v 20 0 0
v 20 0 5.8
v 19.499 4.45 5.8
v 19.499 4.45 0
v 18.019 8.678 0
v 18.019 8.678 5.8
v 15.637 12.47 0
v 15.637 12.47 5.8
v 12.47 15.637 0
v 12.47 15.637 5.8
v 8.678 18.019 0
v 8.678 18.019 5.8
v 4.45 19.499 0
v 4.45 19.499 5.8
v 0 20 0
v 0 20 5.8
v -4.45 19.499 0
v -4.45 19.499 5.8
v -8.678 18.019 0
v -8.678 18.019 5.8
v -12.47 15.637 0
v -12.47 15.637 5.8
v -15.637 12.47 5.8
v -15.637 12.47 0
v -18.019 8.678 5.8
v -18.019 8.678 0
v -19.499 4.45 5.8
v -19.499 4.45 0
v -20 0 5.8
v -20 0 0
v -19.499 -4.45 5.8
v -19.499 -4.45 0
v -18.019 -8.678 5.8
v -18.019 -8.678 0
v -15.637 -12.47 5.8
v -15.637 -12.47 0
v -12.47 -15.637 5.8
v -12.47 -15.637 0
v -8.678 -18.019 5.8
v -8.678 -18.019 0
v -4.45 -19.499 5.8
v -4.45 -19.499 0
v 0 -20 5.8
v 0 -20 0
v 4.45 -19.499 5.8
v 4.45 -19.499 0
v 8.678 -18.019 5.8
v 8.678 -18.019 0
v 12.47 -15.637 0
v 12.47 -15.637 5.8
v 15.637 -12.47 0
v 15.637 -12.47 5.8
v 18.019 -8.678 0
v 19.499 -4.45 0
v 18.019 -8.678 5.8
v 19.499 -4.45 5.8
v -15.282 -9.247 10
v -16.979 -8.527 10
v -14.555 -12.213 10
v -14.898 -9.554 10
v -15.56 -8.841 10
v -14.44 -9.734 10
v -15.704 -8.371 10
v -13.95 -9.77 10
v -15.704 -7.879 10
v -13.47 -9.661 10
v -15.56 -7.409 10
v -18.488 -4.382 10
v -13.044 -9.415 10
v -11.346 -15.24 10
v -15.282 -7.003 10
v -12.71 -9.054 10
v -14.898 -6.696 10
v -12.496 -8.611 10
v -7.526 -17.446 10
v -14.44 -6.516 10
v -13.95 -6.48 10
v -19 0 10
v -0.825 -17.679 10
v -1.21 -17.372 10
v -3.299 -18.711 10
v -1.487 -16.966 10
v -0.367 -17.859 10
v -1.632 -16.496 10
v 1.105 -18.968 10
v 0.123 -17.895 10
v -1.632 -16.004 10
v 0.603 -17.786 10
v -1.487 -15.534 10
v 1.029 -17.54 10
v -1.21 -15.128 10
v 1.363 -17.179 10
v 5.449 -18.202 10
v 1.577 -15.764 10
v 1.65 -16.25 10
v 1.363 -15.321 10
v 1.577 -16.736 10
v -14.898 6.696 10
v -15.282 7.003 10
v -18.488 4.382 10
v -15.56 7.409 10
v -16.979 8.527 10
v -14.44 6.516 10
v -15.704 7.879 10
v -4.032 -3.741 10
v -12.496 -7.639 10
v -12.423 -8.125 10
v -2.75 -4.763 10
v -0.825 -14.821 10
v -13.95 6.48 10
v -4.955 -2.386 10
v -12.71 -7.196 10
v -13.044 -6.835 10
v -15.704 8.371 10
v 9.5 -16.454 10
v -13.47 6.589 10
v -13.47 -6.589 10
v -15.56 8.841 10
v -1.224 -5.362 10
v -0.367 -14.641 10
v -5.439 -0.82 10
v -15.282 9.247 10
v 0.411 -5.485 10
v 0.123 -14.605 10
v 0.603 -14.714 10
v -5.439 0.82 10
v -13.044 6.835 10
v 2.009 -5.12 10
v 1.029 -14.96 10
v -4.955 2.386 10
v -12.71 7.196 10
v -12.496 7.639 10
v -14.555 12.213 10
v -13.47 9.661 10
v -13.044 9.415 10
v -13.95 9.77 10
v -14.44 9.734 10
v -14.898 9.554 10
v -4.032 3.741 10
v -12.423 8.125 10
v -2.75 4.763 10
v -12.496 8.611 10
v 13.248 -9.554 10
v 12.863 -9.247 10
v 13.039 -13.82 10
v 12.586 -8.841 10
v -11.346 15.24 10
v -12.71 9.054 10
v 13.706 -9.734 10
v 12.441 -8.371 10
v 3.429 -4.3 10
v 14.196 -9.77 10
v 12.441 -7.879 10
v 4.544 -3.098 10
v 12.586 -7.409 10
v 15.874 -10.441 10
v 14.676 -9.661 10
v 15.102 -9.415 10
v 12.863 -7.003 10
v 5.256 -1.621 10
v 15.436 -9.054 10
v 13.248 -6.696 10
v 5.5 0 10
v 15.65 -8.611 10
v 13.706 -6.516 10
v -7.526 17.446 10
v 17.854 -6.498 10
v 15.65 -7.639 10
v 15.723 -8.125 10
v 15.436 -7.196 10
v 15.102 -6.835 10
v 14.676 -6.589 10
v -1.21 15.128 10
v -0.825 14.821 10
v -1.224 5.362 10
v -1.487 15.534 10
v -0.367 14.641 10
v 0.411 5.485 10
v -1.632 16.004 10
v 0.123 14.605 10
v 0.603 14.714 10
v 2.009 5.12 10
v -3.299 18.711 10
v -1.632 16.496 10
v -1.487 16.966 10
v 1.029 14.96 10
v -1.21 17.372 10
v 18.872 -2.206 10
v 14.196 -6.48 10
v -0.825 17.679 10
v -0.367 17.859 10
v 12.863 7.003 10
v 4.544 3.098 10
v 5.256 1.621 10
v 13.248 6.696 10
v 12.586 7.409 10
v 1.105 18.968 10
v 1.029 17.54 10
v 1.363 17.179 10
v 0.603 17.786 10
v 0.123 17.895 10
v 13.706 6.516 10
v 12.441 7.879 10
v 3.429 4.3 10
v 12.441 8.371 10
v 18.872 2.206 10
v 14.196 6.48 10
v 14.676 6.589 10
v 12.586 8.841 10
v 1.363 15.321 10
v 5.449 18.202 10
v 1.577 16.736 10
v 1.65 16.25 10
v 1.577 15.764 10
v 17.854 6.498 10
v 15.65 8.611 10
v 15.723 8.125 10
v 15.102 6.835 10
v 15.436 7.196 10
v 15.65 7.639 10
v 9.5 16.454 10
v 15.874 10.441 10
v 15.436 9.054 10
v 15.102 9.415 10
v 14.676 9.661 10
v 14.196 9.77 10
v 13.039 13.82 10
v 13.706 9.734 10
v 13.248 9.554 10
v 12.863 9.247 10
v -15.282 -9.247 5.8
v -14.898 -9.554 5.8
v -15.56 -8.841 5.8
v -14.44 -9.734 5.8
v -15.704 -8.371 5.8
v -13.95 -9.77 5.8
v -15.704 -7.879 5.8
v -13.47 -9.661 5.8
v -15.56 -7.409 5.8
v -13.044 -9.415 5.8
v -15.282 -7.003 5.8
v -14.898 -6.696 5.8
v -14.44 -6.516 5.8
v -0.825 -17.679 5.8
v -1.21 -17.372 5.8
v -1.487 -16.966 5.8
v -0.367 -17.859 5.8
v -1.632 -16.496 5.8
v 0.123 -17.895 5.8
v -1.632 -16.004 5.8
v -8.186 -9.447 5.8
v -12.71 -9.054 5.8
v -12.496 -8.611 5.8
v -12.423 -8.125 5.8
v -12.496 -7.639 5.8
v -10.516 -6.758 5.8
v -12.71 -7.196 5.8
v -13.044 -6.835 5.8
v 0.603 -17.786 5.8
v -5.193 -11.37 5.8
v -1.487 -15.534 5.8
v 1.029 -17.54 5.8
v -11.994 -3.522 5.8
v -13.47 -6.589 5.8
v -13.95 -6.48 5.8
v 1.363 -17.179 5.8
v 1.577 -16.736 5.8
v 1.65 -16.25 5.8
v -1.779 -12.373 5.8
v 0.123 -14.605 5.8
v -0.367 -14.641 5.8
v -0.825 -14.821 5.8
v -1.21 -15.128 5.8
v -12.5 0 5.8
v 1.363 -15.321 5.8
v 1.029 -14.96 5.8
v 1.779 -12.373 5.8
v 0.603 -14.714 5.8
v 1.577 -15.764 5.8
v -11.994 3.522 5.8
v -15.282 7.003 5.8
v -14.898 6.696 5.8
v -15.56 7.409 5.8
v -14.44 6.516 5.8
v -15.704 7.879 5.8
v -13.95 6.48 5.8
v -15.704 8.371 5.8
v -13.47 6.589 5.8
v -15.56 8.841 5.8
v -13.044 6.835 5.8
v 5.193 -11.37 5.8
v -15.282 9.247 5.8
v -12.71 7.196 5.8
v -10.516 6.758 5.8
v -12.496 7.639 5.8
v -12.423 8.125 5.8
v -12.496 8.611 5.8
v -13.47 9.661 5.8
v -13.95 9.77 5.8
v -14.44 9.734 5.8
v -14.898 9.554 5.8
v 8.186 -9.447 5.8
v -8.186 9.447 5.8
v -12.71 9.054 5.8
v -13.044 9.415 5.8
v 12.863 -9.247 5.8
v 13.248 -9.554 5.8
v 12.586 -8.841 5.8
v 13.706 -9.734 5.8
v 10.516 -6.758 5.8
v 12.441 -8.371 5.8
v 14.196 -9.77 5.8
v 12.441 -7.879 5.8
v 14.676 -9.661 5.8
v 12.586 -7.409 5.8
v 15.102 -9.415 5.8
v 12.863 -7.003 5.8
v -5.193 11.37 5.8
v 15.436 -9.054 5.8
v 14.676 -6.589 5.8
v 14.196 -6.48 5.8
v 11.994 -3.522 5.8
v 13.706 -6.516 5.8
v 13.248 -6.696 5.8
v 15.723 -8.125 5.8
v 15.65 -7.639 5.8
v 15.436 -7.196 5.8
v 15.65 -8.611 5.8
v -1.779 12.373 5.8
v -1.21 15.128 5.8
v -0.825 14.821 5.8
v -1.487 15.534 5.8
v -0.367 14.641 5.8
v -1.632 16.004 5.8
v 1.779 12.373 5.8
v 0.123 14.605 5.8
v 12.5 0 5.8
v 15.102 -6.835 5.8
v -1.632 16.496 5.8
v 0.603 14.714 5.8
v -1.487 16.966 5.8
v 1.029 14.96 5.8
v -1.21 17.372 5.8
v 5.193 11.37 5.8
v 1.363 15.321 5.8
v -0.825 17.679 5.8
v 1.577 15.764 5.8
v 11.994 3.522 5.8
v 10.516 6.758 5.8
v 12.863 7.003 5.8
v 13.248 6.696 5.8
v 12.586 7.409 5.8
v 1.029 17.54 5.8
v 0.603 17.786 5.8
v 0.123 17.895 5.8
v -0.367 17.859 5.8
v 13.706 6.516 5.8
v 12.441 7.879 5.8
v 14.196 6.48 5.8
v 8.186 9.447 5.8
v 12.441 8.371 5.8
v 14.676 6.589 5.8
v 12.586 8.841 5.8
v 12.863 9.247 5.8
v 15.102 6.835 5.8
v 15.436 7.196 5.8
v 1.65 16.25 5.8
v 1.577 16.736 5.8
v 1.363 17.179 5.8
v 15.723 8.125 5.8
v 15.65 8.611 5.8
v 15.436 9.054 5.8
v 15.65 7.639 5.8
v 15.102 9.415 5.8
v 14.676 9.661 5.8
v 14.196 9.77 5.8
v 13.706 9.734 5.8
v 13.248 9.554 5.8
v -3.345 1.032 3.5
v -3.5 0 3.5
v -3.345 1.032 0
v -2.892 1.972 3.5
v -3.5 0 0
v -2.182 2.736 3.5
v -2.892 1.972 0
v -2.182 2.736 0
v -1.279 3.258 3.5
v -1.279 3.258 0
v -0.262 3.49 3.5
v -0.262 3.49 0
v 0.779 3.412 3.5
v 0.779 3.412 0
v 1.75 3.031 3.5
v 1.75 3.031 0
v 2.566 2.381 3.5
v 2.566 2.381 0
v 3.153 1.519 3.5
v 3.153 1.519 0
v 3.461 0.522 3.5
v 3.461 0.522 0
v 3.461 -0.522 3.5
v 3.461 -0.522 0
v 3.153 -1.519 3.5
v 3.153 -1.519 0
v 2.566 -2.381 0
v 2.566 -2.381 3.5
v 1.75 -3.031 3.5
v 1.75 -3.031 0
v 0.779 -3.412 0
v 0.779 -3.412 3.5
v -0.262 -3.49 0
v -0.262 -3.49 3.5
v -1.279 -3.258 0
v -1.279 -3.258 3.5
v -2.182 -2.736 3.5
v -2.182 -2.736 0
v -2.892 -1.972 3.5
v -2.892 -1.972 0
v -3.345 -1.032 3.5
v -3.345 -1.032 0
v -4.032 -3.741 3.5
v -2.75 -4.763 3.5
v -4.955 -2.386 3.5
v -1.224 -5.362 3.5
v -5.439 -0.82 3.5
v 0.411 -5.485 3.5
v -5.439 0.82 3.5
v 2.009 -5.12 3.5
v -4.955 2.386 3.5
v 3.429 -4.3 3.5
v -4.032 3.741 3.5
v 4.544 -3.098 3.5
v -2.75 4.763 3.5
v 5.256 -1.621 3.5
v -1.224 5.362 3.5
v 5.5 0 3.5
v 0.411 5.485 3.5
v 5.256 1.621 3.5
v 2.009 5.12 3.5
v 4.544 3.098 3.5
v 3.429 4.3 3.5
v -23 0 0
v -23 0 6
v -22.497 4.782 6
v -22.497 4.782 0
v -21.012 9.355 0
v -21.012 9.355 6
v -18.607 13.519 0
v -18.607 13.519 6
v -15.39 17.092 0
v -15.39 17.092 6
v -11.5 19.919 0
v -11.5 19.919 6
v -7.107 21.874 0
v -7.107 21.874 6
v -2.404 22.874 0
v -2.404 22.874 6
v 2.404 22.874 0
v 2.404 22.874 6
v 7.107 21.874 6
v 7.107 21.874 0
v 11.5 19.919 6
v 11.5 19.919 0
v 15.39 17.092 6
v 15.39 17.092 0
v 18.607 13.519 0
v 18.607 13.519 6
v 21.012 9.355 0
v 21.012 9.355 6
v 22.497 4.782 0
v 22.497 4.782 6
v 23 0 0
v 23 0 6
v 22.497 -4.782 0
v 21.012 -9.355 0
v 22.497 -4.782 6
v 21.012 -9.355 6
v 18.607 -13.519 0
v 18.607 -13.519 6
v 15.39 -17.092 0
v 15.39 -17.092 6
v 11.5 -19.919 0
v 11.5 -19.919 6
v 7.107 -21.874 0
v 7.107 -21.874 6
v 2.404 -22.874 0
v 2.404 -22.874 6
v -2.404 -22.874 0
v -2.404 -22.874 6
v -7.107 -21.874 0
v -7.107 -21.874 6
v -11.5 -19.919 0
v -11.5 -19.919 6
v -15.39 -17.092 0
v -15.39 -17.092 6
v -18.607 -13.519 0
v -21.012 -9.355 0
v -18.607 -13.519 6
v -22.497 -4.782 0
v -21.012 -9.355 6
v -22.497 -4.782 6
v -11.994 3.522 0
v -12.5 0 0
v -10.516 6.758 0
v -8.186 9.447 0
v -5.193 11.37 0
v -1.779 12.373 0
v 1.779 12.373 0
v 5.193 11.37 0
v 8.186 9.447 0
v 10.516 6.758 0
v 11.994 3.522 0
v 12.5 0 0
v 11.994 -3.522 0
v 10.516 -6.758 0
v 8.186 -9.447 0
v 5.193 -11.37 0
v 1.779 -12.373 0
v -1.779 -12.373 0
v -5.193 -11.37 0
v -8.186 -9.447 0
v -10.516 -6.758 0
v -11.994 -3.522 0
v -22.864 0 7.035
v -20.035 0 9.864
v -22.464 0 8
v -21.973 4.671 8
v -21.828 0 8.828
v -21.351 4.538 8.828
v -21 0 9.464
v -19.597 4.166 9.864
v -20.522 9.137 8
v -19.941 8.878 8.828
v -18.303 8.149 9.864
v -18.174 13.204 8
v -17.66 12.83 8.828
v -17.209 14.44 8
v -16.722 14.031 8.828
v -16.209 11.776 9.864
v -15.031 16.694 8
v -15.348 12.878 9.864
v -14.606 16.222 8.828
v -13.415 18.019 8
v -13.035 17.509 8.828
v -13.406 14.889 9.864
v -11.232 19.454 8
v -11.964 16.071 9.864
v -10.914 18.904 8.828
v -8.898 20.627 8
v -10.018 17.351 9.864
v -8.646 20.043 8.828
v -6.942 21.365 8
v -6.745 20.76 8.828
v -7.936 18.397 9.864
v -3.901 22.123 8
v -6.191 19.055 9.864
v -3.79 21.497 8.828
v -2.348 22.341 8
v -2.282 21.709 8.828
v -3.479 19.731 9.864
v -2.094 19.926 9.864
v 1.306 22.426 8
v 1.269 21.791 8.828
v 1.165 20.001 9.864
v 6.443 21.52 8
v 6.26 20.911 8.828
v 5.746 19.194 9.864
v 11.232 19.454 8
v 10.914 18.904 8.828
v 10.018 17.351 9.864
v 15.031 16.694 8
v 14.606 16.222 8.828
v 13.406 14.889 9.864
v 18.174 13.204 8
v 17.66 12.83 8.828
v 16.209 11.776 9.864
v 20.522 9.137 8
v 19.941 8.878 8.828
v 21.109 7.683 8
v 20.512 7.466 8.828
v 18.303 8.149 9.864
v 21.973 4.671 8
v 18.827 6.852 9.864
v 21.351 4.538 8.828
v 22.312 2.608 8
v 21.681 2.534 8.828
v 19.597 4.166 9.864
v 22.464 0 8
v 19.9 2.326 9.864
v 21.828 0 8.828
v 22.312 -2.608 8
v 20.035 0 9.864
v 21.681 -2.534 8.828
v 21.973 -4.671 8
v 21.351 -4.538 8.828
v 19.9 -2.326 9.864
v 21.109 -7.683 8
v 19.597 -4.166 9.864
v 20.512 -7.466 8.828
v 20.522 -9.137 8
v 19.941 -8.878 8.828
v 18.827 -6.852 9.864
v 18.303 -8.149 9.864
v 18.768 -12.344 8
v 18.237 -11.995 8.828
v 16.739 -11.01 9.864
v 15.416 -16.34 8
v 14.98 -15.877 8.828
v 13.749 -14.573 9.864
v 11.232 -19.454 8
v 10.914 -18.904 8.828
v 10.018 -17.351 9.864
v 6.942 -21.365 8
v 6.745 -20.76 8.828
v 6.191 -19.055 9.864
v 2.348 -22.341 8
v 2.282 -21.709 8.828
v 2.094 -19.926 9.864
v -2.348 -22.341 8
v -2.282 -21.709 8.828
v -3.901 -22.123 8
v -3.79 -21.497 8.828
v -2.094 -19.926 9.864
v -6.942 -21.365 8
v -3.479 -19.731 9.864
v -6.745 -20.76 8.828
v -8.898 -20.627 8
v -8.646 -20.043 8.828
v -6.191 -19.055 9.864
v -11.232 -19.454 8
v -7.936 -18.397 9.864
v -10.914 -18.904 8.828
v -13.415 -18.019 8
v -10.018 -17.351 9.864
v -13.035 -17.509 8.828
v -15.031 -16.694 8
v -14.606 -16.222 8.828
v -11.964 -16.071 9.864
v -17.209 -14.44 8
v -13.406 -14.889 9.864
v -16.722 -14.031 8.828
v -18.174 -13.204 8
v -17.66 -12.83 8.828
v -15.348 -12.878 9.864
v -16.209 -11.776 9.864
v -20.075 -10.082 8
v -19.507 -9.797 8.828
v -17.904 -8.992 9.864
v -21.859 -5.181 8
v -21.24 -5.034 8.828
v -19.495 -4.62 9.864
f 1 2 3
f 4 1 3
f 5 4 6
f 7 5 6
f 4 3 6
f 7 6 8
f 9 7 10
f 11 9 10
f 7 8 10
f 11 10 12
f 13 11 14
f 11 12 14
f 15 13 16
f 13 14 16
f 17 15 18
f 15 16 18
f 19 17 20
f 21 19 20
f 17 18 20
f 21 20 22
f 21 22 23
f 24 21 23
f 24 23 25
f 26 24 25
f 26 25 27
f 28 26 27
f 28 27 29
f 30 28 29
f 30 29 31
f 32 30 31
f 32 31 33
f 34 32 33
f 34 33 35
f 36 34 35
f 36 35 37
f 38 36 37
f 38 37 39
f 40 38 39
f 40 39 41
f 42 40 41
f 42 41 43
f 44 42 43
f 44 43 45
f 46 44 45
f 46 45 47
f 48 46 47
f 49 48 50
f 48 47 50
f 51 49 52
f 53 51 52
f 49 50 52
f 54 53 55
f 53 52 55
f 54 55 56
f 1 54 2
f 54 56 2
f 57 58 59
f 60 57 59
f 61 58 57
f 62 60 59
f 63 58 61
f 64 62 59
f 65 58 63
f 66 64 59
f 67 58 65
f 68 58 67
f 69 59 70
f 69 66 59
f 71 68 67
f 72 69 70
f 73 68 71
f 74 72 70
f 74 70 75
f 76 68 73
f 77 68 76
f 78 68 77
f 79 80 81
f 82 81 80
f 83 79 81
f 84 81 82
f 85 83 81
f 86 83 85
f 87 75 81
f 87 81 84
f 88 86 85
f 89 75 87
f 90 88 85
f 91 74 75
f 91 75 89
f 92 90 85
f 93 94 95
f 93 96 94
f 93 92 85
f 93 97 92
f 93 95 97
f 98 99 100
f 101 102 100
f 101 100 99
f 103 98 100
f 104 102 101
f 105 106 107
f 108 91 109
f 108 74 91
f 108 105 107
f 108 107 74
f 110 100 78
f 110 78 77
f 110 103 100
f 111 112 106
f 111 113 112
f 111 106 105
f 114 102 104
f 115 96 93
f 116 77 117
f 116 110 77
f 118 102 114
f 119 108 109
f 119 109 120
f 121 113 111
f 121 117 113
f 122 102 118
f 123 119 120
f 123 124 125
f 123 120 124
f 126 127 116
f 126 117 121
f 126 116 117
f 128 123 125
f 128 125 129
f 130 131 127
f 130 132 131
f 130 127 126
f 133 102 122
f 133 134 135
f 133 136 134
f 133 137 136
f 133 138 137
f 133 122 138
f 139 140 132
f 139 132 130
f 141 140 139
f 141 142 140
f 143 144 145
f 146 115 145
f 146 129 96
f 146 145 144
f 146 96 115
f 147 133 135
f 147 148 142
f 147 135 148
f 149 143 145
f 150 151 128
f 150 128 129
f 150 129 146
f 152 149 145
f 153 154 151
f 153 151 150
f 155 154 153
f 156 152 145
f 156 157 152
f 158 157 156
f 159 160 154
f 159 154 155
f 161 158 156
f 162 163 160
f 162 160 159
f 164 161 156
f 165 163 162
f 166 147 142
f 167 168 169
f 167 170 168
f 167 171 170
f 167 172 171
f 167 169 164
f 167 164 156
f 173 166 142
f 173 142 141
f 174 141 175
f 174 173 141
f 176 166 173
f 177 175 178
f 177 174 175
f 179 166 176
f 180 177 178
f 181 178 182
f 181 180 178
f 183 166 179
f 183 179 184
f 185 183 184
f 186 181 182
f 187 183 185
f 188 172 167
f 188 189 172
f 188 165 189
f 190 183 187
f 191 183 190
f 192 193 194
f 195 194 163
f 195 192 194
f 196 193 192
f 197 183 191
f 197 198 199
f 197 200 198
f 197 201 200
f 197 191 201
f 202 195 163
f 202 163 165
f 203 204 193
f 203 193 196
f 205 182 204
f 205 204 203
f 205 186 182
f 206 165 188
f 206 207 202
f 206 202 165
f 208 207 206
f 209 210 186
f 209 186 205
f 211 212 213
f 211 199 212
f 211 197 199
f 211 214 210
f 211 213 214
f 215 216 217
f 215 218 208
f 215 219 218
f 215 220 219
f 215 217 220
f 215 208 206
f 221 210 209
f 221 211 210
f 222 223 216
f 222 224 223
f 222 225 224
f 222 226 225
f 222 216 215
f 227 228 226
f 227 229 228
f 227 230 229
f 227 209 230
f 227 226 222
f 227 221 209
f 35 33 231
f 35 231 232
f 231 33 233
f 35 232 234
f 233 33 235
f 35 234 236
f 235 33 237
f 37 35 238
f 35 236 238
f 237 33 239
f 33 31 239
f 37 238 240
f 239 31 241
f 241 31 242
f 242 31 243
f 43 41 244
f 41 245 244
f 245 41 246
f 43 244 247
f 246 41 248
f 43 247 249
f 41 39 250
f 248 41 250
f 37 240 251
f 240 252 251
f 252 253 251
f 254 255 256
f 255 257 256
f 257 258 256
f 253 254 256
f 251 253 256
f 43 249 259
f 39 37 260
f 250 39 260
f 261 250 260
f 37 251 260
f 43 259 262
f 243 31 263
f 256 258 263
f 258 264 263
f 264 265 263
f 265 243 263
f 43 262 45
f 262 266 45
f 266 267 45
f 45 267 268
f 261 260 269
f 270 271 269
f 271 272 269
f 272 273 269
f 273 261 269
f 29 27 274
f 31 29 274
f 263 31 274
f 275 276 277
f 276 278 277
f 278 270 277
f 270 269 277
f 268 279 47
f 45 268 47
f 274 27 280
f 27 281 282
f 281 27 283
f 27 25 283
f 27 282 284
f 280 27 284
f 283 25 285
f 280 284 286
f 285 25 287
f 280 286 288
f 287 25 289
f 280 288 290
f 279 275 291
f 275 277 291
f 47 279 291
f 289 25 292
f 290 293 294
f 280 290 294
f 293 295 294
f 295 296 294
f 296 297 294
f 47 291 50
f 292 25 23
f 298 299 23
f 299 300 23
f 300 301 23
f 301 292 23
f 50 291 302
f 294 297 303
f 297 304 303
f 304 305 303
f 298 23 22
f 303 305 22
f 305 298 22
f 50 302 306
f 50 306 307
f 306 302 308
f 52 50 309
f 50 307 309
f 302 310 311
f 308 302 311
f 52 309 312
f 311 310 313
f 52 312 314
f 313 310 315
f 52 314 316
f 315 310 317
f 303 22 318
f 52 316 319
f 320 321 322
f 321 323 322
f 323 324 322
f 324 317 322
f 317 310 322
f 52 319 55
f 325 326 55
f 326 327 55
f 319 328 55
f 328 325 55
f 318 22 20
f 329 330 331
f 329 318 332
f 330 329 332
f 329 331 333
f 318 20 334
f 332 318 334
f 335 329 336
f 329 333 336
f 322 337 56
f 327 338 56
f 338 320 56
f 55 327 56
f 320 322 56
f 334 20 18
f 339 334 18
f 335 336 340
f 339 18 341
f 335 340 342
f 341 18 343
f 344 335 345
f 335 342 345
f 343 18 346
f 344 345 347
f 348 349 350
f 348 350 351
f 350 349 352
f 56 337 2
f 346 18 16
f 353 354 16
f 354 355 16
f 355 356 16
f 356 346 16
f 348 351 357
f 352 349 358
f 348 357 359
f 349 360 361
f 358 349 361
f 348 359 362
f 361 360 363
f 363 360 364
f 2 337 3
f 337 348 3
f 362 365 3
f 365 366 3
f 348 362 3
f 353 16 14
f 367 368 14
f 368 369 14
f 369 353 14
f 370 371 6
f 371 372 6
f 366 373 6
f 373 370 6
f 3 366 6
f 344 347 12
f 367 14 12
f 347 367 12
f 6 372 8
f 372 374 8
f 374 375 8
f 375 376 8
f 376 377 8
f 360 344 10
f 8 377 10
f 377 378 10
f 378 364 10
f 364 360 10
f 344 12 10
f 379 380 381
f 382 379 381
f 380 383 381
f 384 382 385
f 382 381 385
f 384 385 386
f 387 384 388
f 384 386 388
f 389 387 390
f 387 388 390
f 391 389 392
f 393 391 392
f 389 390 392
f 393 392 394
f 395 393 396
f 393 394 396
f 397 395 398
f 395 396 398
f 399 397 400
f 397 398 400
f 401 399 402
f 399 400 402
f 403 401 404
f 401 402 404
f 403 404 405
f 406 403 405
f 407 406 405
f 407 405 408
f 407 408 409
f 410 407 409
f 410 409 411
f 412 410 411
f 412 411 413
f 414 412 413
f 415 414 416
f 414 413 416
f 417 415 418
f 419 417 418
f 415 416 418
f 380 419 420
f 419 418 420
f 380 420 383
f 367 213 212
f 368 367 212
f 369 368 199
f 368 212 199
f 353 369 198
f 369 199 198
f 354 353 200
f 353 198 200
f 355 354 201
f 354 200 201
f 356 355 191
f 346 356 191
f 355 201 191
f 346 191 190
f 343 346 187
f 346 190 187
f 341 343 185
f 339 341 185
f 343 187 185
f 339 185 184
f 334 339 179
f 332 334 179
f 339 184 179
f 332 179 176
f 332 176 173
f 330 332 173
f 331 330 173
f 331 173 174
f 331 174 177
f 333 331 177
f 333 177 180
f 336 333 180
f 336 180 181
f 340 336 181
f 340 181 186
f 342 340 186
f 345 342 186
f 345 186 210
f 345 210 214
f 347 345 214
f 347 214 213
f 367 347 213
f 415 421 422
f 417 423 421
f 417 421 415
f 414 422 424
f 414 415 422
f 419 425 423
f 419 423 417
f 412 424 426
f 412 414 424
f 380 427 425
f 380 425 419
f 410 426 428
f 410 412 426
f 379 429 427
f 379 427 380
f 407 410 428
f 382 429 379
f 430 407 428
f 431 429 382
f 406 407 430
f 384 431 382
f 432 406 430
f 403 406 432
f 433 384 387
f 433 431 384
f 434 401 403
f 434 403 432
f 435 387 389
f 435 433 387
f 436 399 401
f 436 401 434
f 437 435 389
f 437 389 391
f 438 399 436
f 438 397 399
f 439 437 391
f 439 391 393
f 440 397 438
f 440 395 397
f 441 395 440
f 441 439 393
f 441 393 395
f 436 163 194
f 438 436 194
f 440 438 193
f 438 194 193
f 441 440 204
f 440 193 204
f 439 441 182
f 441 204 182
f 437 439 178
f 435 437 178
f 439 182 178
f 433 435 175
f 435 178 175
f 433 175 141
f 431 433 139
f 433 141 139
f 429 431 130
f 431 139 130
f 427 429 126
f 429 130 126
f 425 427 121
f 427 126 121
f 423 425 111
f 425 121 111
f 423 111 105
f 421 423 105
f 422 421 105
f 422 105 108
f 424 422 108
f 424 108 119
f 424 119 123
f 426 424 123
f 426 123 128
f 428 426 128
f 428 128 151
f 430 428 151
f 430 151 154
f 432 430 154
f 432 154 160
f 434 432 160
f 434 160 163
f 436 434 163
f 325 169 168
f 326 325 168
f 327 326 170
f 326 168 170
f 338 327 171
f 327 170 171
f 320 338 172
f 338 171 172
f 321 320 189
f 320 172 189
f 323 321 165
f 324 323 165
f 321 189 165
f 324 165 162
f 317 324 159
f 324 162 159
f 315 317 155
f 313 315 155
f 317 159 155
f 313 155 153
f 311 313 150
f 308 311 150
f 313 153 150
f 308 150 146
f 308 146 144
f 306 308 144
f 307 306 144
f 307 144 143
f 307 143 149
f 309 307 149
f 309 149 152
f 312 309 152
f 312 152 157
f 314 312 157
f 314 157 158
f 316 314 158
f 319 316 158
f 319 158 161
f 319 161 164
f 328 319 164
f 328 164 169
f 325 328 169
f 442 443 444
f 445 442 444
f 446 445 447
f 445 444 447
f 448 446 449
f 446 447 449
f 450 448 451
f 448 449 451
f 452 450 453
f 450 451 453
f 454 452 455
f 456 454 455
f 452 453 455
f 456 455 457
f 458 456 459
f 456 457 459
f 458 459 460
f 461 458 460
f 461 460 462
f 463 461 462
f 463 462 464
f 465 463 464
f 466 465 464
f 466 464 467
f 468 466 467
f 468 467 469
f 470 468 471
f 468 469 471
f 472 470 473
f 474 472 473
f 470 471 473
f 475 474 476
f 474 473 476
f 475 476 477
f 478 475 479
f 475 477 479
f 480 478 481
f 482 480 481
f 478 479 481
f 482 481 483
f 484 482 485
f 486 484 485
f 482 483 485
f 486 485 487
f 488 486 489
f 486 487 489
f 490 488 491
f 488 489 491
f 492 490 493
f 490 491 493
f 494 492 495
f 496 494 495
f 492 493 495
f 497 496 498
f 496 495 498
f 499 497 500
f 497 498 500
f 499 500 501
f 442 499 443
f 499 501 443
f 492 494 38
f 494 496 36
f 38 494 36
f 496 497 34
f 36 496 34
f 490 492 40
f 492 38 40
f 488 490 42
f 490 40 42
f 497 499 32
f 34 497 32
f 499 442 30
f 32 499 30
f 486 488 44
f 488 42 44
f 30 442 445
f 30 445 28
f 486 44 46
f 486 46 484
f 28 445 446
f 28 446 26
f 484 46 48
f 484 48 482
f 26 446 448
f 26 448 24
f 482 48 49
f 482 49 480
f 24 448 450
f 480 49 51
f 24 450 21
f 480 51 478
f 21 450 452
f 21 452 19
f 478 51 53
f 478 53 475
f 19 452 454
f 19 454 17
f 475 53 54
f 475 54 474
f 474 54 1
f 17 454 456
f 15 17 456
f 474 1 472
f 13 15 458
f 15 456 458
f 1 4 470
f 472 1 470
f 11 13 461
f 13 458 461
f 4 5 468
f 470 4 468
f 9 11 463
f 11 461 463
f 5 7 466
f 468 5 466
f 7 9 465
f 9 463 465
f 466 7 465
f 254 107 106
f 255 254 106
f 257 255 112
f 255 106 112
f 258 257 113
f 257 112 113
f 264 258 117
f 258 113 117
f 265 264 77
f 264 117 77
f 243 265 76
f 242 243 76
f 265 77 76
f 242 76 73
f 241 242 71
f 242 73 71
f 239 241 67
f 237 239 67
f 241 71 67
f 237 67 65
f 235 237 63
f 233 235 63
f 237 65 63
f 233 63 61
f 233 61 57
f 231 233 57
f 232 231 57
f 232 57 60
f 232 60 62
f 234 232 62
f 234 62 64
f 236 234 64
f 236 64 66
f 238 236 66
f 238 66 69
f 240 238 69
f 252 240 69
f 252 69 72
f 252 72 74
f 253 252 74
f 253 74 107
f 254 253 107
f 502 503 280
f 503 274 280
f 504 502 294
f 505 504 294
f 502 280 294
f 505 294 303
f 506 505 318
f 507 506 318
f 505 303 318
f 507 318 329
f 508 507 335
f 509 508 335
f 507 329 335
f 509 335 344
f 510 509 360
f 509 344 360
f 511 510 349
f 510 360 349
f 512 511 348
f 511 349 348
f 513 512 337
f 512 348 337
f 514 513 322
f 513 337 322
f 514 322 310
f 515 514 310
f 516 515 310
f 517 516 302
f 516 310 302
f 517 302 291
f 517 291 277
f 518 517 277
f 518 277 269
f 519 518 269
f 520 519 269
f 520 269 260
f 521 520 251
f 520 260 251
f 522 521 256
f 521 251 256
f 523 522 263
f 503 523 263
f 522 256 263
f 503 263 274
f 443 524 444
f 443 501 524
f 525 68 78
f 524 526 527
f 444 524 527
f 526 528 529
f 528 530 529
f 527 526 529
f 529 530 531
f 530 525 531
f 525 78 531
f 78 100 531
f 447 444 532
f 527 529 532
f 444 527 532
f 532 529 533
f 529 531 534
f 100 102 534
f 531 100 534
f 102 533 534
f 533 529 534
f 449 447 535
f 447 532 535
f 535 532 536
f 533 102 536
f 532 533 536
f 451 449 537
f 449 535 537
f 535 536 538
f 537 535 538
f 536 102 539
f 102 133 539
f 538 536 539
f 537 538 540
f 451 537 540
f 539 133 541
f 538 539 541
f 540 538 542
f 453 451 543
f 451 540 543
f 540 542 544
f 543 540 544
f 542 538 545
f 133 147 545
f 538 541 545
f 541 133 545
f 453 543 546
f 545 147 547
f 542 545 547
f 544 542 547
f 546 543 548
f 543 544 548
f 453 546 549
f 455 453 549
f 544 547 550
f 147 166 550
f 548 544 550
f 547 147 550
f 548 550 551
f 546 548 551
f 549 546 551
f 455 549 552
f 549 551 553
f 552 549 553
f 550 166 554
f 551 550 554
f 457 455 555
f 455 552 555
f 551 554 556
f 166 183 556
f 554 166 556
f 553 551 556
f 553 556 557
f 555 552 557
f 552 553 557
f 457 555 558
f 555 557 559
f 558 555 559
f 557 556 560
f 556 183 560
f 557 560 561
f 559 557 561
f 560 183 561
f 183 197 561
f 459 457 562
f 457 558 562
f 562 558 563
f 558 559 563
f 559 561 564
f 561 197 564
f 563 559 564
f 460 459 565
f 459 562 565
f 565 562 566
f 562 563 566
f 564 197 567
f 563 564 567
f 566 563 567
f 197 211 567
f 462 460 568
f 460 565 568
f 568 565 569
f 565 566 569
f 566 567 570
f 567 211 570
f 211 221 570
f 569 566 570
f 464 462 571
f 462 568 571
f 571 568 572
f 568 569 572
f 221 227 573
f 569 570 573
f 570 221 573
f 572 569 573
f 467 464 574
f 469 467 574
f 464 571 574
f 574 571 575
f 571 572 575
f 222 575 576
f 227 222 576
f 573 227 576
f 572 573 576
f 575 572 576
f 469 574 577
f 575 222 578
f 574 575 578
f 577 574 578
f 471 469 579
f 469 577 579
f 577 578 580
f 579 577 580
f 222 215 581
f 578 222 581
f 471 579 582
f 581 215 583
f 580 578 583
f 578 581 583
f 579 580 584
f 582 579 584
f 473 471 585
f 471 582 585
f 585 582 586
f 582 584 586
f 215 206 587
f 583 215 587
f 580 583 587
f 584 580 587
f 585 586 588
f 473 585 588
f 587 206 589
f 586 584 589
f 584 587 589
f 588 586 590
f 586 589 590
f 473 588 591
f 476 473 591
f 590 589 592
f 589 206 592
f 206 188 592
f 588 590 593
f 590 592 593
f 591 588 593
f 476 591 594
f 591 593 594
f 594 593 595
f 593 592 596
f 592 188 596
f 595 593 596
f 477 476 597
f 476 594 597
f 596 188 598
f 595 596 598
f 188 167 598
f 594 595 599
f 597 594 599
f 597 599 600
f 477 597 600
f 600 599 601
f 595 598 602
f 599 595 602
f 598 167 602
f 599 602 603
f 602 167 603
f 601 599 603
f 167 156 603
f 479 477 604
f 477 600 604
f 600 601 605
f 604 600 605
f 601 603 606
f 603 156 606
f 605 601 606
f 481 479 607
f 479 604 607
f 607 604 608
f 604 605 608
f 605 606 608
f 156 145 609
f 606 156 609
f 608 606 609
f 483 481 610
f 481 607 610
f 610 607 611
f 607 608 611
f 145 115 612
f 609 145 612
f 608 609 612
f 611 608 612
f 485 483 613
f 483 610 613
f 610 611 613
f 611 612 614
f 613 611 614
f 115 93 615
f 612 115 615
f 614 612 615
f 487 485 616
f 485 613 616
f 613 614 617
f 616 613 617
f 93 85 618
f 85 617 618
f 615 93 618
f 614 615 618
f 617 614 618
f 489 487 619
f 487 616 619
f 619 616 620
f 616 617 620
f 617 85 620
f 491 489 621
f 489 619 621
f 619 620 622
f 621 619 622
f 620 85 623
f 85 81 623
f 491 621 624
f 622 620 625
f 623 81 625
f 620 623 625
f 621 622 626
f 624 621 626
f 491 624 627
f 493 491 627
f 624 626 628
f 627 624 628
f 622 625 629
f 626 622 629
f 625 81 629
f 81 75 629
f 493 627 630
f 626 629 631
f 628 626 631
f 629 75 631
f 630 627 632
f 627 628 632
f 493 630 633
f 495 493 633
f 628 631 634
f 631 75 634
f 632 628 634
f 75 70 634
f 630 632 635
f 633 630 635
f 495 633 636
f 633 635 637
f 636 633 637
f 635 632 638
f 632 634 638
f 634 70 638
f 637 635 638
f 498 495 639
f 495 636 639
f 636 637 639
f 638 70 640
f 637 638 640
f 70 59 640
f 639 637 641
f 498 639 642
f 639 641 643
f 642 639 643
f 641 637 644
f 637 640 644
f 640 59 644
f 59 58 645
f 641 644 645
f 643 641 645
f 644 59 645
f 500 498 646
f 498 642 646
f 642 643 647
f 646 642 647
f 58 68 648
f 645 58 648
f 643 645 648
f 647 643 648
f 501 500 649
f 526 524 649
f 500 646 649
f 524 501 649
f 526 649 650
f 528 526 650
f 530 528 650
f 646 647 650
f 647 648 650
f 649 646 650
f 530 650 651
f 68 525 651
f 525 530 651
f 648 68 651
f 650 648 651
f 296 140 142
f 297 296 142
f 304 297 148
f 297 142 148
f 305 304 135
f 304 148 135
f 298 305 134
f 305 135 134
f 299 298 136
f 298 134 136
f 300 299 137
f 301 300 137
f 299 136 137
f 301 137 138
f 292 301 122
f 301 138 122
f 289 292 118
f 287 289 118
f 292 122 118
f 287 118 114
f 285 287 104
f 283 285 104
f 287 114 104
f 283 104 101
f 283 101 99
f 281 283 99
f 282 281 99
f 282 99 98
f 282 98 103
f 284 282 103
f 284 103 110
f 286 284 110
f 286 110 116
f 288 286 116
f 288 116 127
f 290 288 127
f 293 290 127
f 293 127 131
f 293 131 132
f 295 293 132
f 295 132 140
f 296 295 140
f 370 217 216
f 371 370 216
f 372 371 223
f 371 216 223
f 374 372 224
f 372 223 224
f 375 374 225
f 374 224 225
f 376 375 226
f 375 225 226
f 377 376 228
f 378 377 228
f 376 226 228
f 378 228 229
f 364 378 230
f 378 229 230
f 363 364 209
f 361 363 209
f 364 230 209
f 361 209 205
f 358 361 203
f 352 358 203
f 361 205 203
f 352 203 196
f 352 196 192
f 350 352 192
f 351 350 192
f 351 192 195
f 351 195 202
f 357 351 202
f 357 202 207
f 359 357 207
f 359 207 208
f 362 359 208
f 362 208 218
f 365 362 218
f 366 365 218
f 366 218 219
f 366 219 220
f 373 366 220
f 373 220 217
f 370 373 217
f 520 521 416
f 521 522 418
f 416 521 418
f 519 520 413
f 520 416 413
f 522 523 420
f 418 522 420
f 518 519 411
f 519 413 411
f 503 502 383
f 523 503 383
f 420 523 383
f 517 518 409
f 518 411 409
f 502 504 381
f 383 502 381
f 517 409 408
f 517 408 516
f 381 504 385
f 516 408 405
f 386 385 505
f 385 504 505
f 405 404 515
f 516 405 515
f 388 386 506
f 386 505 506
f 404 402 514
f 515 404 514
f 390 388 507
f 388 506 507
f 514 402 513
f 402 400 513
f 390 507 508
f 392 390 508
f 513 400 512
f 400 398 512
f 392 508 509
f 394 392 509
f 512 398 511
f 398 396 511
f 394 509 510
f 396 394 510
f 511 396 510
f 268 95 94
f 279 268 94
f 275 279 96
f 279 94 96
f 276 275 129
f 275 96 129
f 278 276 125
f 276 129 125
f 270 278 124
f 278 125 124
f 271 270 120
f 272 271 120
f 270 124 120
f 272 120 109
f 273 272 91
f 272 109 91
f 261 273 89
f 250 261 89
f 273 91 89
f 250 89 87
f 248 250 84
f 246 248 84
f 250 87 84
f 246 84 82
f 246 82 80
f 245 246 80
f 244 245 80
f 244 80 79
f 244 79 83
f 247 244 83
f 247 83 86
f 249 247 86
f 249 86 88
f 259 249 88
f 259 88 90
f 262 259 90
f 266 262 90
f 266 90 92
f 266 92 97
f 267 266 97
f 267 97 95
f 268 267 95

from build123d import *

# Parameters (mm, degrees)
SKETCH1_W                      = 23
SKETCH1_H                      = 10
HOLE1_D                        = 40
HOLE1_DEPTH                    = 5.8
SKETCH4_W                      = 12.5
SKETCH4_H                      = 5.8
M4X0_7_TAPPED_HOLE1_D          = 3.3
CBORE_FOR_M6_SHCS1_D           = 7
CBORE_FOR_M6_SHCS1_CBORE_D     = 11
CBORE_FOR_M6_SHCS1_CBORE_DEPTH = 6.5
FILLET1_R                      = 4


with BuildPart() as part:
    # Sketch1 → Revolve1 (revolve)
    with BuildSketch(Plane.XZ, mode=Mode.PRIVATE) as revolve1_sk:
        with Locations((11.5, 5)):
            Rectangle(SKETCH1_W, SKETCH1_H)
    revolve(revolve1_sk.sketch.rotate(Axis((0, 0, 10), (0, 0, -1)), 180), axis=Axis((0, 0, 10), (0, 0, -1)))

    # Hole1
    with Locations(Plane(origin=(0, 0, 0), x_dir=(-1, 0, 0), z_dir=(0, 0, -1))):
        with Locations((0, 0)):
            Hole(HOLE1_D / 2, depth=HOLE1_DEPTH)

    # Sketch4 → Revolve2 (revolve)
    with BuildSketch(Plane.XZ, mode=Mode.PRIVATE) as revolve2_sk:
        with Locations((6.25, 2.9)):
            Rectangle(SKETCH4_W, SKETCH4_H)
    revolve(revolve2_sk.sketch.rotate(Axis((0, 0, 5.8), (0, 0, -1)), 180), axis=Axis((0, 0, 5.8), (0, 0, -1)))

    # M4x0.7 Tapped Hole1 (through all)
    with Locations(Plane(origin=(0, 0, 5.8), x_dir=(-1, 0, 0), z_dir=(0, 0, -1))):
        with Locations((-14.072912811, 8.125), (-14.072912811, -8.125), (0, -16.25), (14.072912811, -8.125), (14.072912811, 8.125), (0, 16.25)):
            Hole(M4X0_7_TAPPED_HOLE1_D / 2)

    # CBORE for M6 SHCS1 (through all)
    with Locations(Plane.XY.offset(10)):
        with Locations((0, 0)):
            CounterBoreHole(CBORE_FOR_M6_SHCS1_D / 2, CBORE_FOR_M6_SHCS1_CBORE_D / 2, CBORE_FOR_M6_SHCS1_CBORE_DEPTH)

    # Fillet1
    fillet1_edges = [part.edges().sort_by_distance(p)[0] for p in [
        (23, 0, 10),
    ]]
    fillet(fillet1_edges, radius=FILLET1_R)


solid = part.part
